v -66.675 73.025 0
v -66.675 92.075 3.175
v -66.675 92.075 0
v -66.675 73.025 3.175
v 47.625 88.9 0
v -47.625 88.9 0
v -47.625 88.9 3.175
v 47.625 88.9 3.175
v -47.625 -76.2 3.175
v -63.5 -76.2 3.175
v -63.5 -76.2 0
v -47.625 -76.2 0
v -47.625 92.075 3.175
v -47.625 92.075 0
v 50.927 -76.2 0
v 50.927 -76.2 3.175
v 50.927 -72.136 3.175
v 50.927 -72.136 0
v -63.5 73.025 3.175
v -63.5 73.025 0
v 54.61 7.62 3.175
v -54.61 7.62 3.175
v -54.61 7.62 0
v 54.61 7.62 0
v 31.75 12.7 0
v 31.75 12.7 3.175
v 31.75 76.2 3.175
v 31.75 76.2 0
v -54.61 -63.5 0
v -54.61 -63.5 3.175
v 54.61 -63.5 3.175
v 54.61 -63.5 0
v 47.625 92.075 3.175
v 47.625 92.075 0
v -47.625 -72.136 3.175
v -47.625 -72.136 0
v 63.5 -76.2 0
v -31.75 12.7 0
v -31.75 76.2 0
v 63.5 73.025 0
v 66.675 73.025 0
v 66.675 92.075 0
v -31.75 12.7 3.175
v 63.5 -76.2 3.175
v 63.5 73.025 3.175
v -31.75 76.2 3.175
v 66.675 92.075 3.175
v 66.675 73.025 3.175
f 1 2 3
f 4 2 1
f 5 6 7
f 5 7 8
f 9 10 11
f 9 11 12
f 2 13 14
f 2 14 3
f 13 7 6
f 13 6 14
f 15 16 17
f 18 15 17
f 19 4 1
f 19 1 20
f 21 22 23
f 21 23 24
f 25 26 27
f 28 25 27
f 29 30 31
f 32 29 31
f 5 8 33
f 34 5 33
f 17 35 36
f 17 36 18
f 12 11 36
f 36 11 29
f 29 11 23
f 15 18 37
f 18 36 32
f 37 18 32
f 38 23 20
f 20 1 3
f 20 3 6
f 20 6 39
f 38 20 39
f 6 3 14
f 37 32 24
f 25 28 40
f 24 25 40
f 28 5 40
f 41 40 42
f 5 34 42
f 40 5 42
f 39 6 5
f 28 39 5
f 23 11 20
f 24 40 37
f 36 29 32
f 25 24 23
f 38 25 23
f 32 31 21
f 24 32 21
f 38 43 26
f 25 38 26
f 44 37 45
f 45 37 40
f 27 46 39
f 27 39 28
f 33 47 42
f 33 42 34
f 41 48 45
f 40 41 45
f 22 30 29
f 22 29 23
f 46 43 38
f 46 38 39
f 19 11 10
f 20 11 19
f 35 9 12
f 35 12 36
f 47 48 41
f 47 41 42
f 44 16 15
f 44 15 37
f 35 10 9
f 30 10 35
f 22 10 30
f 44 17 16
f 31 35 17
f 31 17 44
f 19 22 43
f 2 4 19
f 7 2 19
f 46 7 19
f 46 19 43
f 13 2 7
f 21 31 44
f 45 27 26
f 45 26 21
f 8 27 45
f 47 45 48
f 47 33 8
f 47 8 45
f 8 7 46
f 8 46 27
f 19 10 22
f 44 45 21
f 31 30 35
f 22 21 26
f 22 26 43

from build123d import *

# Parameters (mm, degrees)
SKETCH1_W           = 127
SKETCH1_H           = 177.8
BOSS_EXTRUDE1_DEPTH = 3.175
SKETCH3_W           = 63.5
SKETCH3_H           = 63.5
SKETCH3_W_2         = 109.22
SKETCH3_H_2         = 71.12
CUT_EXTRUDE2_DEPTH  = 4.175
BOSS_EXTRUDE2_DEPTH = 3.175
CUT_EXTRUDE3_REACH  = 5.175
SKETCH5_W           = 19.05
SKETCH5_H           = 12.7
SKETCH6_W           = 3.302
SKETCH6_H           = 12.7
CUT_EXTRUDE4_DEPTH  = 4.175
CUT_EXTRUDE5_DEPTH  = 4.175
SKETCH9_W           = 6.477
SKETCH9_H           = 4.064
CUT_EXTRUDE6_DEPTH  = 4.175


with BuildPart() as part:
    # Sketch1 → Boss-Extrude1 (new body)
    with BuildSketch(Plane.XY):
        Rectangle(SKETCH1_W, SKETCH1_H)
    extrude(amount=BOSS_EXTRUDE1_DEPTH)

    # Sketch3 → Cut-Extrude2 (cut, through all)
    with BuildSketch(Plane.XY.offset(3.175)):
        with Locations((0, 44.45)):
            Rectangle(SKETCH3_W, SKETCH3_H)
        with Locations((0, -27.94)):
            Rectangle(SKETCH3_W_2, SKETCH3_H_2)
    extrude(amount=-CUT_EXTRUDE2_DEPTH, mode=Mode.SUBTRACT)

    # Sketch4 → Boss-Extrude2 (add)
    with BuildSketch(Plane.XY.offset(3.175)):
        Polygon((-60.325, 92.075), (-66.675, 92.075), (-66.675, 85.725), (-66.675, 73.025), (-60.325, 73.025), (-60.325, 85.725), (-47.625, 85.725), (-47.625, 92.075), align=None)
        Polygon((60.325, 92.075), (66.675, 92.075), (66.675, 85.725), (66.675, 73.025), (60.325, 73.025), (60.325, 85.725), (47.625, 85.725), (47.625, 92.075), align=None)
    extrude(amount=-BOSS_EXTRUDE2_DEPTH)

    # Sketch5 → Cut-Extrude3 (cut, up to next)
    with BuildSketch(Plane.XY.offset(3.175), mode=Mode.PRIVATE) as cut_extrude3_sk1:
        with Locations((-53.975, -82.55)):
            Rectangle(SKETCH5_W, SKETCH5_H)
    cut_extrude3_tool1 = extrude(cut_extrude3_sk1.sketch, amount=-CUT_EXTRUDE3_REACH, mode=Mode.PRIVATE) & part.part
    add(cut_extrude3_tool1.solids().sort_by_distance((-53.975, -82.55, 3.175))[0], mode=Mode.SUBTRACT)
    # Sketch5 → Cut-Extrude3 (cut, up to next)
    with BuildSketch(Plane.XY.offset(3.175), mode=Mode.PRIVATE) as cut_extrude3_sk2:
        with Locations((53.975, -82.55)):
            Rectangle(SKETCH5_W, SKETCH5_H)
    cut_extrude3_tool2 = extrude(cut_extrude3_sk2.sketch, amount=-CUT_EXTRUDE3_REACH, mode=Mode.PRIVATE) & part.part
    add(cut_extrude3_tool2.solids().sort_by_distance((53.975, -82.55, 3.175))[0], mode=Mode.SUBTRACT)

    # Sketch6 → Cut-Extrude4 (cut, through all)
    with BuildSketch(Plane.XY.offset(3.175)):
        with Locations((-42.799, -82.55)):
            Rectangle(SKETCH6_W, SKETCH6_H)
    extrude(amount=-CUT_EXTRUDE4_DEPTH, mode=Mode.SUBTRACT)

    # Sketch7 → Cut-Extrude5 (cut, through all)
    with BuildSketch(Plane.XY.offset(3.175)):
        Polygon((-41.148, -76.2), (-41.148, -72.136), (44.45, -72.136), (44.45, -76.2), (44.45, -88.9), (-41.148, -88.9), align=None)
    extrude(amount=-CUT_EXTRUDE5_DEPTH, mode=Mode.SUBTRACT)

    # Sketch9 → Cut-Extrude6 (cut, through all)
    with BuildSketch(Plane.XY.offset(3.175)):
        with Locations((-44.3865, -74.168)):
            Rectangle(SKETCH9_W, SKETCH9_H)
        with Locations((47.6885, -74.168)):
            Rectangle(SKETCH9_W, SKETCH9_H)
    extrude(amount=-CUT_EXTRUDE6_DEPTH, mode=Mode.SUBTRACT)


solid = part.part
